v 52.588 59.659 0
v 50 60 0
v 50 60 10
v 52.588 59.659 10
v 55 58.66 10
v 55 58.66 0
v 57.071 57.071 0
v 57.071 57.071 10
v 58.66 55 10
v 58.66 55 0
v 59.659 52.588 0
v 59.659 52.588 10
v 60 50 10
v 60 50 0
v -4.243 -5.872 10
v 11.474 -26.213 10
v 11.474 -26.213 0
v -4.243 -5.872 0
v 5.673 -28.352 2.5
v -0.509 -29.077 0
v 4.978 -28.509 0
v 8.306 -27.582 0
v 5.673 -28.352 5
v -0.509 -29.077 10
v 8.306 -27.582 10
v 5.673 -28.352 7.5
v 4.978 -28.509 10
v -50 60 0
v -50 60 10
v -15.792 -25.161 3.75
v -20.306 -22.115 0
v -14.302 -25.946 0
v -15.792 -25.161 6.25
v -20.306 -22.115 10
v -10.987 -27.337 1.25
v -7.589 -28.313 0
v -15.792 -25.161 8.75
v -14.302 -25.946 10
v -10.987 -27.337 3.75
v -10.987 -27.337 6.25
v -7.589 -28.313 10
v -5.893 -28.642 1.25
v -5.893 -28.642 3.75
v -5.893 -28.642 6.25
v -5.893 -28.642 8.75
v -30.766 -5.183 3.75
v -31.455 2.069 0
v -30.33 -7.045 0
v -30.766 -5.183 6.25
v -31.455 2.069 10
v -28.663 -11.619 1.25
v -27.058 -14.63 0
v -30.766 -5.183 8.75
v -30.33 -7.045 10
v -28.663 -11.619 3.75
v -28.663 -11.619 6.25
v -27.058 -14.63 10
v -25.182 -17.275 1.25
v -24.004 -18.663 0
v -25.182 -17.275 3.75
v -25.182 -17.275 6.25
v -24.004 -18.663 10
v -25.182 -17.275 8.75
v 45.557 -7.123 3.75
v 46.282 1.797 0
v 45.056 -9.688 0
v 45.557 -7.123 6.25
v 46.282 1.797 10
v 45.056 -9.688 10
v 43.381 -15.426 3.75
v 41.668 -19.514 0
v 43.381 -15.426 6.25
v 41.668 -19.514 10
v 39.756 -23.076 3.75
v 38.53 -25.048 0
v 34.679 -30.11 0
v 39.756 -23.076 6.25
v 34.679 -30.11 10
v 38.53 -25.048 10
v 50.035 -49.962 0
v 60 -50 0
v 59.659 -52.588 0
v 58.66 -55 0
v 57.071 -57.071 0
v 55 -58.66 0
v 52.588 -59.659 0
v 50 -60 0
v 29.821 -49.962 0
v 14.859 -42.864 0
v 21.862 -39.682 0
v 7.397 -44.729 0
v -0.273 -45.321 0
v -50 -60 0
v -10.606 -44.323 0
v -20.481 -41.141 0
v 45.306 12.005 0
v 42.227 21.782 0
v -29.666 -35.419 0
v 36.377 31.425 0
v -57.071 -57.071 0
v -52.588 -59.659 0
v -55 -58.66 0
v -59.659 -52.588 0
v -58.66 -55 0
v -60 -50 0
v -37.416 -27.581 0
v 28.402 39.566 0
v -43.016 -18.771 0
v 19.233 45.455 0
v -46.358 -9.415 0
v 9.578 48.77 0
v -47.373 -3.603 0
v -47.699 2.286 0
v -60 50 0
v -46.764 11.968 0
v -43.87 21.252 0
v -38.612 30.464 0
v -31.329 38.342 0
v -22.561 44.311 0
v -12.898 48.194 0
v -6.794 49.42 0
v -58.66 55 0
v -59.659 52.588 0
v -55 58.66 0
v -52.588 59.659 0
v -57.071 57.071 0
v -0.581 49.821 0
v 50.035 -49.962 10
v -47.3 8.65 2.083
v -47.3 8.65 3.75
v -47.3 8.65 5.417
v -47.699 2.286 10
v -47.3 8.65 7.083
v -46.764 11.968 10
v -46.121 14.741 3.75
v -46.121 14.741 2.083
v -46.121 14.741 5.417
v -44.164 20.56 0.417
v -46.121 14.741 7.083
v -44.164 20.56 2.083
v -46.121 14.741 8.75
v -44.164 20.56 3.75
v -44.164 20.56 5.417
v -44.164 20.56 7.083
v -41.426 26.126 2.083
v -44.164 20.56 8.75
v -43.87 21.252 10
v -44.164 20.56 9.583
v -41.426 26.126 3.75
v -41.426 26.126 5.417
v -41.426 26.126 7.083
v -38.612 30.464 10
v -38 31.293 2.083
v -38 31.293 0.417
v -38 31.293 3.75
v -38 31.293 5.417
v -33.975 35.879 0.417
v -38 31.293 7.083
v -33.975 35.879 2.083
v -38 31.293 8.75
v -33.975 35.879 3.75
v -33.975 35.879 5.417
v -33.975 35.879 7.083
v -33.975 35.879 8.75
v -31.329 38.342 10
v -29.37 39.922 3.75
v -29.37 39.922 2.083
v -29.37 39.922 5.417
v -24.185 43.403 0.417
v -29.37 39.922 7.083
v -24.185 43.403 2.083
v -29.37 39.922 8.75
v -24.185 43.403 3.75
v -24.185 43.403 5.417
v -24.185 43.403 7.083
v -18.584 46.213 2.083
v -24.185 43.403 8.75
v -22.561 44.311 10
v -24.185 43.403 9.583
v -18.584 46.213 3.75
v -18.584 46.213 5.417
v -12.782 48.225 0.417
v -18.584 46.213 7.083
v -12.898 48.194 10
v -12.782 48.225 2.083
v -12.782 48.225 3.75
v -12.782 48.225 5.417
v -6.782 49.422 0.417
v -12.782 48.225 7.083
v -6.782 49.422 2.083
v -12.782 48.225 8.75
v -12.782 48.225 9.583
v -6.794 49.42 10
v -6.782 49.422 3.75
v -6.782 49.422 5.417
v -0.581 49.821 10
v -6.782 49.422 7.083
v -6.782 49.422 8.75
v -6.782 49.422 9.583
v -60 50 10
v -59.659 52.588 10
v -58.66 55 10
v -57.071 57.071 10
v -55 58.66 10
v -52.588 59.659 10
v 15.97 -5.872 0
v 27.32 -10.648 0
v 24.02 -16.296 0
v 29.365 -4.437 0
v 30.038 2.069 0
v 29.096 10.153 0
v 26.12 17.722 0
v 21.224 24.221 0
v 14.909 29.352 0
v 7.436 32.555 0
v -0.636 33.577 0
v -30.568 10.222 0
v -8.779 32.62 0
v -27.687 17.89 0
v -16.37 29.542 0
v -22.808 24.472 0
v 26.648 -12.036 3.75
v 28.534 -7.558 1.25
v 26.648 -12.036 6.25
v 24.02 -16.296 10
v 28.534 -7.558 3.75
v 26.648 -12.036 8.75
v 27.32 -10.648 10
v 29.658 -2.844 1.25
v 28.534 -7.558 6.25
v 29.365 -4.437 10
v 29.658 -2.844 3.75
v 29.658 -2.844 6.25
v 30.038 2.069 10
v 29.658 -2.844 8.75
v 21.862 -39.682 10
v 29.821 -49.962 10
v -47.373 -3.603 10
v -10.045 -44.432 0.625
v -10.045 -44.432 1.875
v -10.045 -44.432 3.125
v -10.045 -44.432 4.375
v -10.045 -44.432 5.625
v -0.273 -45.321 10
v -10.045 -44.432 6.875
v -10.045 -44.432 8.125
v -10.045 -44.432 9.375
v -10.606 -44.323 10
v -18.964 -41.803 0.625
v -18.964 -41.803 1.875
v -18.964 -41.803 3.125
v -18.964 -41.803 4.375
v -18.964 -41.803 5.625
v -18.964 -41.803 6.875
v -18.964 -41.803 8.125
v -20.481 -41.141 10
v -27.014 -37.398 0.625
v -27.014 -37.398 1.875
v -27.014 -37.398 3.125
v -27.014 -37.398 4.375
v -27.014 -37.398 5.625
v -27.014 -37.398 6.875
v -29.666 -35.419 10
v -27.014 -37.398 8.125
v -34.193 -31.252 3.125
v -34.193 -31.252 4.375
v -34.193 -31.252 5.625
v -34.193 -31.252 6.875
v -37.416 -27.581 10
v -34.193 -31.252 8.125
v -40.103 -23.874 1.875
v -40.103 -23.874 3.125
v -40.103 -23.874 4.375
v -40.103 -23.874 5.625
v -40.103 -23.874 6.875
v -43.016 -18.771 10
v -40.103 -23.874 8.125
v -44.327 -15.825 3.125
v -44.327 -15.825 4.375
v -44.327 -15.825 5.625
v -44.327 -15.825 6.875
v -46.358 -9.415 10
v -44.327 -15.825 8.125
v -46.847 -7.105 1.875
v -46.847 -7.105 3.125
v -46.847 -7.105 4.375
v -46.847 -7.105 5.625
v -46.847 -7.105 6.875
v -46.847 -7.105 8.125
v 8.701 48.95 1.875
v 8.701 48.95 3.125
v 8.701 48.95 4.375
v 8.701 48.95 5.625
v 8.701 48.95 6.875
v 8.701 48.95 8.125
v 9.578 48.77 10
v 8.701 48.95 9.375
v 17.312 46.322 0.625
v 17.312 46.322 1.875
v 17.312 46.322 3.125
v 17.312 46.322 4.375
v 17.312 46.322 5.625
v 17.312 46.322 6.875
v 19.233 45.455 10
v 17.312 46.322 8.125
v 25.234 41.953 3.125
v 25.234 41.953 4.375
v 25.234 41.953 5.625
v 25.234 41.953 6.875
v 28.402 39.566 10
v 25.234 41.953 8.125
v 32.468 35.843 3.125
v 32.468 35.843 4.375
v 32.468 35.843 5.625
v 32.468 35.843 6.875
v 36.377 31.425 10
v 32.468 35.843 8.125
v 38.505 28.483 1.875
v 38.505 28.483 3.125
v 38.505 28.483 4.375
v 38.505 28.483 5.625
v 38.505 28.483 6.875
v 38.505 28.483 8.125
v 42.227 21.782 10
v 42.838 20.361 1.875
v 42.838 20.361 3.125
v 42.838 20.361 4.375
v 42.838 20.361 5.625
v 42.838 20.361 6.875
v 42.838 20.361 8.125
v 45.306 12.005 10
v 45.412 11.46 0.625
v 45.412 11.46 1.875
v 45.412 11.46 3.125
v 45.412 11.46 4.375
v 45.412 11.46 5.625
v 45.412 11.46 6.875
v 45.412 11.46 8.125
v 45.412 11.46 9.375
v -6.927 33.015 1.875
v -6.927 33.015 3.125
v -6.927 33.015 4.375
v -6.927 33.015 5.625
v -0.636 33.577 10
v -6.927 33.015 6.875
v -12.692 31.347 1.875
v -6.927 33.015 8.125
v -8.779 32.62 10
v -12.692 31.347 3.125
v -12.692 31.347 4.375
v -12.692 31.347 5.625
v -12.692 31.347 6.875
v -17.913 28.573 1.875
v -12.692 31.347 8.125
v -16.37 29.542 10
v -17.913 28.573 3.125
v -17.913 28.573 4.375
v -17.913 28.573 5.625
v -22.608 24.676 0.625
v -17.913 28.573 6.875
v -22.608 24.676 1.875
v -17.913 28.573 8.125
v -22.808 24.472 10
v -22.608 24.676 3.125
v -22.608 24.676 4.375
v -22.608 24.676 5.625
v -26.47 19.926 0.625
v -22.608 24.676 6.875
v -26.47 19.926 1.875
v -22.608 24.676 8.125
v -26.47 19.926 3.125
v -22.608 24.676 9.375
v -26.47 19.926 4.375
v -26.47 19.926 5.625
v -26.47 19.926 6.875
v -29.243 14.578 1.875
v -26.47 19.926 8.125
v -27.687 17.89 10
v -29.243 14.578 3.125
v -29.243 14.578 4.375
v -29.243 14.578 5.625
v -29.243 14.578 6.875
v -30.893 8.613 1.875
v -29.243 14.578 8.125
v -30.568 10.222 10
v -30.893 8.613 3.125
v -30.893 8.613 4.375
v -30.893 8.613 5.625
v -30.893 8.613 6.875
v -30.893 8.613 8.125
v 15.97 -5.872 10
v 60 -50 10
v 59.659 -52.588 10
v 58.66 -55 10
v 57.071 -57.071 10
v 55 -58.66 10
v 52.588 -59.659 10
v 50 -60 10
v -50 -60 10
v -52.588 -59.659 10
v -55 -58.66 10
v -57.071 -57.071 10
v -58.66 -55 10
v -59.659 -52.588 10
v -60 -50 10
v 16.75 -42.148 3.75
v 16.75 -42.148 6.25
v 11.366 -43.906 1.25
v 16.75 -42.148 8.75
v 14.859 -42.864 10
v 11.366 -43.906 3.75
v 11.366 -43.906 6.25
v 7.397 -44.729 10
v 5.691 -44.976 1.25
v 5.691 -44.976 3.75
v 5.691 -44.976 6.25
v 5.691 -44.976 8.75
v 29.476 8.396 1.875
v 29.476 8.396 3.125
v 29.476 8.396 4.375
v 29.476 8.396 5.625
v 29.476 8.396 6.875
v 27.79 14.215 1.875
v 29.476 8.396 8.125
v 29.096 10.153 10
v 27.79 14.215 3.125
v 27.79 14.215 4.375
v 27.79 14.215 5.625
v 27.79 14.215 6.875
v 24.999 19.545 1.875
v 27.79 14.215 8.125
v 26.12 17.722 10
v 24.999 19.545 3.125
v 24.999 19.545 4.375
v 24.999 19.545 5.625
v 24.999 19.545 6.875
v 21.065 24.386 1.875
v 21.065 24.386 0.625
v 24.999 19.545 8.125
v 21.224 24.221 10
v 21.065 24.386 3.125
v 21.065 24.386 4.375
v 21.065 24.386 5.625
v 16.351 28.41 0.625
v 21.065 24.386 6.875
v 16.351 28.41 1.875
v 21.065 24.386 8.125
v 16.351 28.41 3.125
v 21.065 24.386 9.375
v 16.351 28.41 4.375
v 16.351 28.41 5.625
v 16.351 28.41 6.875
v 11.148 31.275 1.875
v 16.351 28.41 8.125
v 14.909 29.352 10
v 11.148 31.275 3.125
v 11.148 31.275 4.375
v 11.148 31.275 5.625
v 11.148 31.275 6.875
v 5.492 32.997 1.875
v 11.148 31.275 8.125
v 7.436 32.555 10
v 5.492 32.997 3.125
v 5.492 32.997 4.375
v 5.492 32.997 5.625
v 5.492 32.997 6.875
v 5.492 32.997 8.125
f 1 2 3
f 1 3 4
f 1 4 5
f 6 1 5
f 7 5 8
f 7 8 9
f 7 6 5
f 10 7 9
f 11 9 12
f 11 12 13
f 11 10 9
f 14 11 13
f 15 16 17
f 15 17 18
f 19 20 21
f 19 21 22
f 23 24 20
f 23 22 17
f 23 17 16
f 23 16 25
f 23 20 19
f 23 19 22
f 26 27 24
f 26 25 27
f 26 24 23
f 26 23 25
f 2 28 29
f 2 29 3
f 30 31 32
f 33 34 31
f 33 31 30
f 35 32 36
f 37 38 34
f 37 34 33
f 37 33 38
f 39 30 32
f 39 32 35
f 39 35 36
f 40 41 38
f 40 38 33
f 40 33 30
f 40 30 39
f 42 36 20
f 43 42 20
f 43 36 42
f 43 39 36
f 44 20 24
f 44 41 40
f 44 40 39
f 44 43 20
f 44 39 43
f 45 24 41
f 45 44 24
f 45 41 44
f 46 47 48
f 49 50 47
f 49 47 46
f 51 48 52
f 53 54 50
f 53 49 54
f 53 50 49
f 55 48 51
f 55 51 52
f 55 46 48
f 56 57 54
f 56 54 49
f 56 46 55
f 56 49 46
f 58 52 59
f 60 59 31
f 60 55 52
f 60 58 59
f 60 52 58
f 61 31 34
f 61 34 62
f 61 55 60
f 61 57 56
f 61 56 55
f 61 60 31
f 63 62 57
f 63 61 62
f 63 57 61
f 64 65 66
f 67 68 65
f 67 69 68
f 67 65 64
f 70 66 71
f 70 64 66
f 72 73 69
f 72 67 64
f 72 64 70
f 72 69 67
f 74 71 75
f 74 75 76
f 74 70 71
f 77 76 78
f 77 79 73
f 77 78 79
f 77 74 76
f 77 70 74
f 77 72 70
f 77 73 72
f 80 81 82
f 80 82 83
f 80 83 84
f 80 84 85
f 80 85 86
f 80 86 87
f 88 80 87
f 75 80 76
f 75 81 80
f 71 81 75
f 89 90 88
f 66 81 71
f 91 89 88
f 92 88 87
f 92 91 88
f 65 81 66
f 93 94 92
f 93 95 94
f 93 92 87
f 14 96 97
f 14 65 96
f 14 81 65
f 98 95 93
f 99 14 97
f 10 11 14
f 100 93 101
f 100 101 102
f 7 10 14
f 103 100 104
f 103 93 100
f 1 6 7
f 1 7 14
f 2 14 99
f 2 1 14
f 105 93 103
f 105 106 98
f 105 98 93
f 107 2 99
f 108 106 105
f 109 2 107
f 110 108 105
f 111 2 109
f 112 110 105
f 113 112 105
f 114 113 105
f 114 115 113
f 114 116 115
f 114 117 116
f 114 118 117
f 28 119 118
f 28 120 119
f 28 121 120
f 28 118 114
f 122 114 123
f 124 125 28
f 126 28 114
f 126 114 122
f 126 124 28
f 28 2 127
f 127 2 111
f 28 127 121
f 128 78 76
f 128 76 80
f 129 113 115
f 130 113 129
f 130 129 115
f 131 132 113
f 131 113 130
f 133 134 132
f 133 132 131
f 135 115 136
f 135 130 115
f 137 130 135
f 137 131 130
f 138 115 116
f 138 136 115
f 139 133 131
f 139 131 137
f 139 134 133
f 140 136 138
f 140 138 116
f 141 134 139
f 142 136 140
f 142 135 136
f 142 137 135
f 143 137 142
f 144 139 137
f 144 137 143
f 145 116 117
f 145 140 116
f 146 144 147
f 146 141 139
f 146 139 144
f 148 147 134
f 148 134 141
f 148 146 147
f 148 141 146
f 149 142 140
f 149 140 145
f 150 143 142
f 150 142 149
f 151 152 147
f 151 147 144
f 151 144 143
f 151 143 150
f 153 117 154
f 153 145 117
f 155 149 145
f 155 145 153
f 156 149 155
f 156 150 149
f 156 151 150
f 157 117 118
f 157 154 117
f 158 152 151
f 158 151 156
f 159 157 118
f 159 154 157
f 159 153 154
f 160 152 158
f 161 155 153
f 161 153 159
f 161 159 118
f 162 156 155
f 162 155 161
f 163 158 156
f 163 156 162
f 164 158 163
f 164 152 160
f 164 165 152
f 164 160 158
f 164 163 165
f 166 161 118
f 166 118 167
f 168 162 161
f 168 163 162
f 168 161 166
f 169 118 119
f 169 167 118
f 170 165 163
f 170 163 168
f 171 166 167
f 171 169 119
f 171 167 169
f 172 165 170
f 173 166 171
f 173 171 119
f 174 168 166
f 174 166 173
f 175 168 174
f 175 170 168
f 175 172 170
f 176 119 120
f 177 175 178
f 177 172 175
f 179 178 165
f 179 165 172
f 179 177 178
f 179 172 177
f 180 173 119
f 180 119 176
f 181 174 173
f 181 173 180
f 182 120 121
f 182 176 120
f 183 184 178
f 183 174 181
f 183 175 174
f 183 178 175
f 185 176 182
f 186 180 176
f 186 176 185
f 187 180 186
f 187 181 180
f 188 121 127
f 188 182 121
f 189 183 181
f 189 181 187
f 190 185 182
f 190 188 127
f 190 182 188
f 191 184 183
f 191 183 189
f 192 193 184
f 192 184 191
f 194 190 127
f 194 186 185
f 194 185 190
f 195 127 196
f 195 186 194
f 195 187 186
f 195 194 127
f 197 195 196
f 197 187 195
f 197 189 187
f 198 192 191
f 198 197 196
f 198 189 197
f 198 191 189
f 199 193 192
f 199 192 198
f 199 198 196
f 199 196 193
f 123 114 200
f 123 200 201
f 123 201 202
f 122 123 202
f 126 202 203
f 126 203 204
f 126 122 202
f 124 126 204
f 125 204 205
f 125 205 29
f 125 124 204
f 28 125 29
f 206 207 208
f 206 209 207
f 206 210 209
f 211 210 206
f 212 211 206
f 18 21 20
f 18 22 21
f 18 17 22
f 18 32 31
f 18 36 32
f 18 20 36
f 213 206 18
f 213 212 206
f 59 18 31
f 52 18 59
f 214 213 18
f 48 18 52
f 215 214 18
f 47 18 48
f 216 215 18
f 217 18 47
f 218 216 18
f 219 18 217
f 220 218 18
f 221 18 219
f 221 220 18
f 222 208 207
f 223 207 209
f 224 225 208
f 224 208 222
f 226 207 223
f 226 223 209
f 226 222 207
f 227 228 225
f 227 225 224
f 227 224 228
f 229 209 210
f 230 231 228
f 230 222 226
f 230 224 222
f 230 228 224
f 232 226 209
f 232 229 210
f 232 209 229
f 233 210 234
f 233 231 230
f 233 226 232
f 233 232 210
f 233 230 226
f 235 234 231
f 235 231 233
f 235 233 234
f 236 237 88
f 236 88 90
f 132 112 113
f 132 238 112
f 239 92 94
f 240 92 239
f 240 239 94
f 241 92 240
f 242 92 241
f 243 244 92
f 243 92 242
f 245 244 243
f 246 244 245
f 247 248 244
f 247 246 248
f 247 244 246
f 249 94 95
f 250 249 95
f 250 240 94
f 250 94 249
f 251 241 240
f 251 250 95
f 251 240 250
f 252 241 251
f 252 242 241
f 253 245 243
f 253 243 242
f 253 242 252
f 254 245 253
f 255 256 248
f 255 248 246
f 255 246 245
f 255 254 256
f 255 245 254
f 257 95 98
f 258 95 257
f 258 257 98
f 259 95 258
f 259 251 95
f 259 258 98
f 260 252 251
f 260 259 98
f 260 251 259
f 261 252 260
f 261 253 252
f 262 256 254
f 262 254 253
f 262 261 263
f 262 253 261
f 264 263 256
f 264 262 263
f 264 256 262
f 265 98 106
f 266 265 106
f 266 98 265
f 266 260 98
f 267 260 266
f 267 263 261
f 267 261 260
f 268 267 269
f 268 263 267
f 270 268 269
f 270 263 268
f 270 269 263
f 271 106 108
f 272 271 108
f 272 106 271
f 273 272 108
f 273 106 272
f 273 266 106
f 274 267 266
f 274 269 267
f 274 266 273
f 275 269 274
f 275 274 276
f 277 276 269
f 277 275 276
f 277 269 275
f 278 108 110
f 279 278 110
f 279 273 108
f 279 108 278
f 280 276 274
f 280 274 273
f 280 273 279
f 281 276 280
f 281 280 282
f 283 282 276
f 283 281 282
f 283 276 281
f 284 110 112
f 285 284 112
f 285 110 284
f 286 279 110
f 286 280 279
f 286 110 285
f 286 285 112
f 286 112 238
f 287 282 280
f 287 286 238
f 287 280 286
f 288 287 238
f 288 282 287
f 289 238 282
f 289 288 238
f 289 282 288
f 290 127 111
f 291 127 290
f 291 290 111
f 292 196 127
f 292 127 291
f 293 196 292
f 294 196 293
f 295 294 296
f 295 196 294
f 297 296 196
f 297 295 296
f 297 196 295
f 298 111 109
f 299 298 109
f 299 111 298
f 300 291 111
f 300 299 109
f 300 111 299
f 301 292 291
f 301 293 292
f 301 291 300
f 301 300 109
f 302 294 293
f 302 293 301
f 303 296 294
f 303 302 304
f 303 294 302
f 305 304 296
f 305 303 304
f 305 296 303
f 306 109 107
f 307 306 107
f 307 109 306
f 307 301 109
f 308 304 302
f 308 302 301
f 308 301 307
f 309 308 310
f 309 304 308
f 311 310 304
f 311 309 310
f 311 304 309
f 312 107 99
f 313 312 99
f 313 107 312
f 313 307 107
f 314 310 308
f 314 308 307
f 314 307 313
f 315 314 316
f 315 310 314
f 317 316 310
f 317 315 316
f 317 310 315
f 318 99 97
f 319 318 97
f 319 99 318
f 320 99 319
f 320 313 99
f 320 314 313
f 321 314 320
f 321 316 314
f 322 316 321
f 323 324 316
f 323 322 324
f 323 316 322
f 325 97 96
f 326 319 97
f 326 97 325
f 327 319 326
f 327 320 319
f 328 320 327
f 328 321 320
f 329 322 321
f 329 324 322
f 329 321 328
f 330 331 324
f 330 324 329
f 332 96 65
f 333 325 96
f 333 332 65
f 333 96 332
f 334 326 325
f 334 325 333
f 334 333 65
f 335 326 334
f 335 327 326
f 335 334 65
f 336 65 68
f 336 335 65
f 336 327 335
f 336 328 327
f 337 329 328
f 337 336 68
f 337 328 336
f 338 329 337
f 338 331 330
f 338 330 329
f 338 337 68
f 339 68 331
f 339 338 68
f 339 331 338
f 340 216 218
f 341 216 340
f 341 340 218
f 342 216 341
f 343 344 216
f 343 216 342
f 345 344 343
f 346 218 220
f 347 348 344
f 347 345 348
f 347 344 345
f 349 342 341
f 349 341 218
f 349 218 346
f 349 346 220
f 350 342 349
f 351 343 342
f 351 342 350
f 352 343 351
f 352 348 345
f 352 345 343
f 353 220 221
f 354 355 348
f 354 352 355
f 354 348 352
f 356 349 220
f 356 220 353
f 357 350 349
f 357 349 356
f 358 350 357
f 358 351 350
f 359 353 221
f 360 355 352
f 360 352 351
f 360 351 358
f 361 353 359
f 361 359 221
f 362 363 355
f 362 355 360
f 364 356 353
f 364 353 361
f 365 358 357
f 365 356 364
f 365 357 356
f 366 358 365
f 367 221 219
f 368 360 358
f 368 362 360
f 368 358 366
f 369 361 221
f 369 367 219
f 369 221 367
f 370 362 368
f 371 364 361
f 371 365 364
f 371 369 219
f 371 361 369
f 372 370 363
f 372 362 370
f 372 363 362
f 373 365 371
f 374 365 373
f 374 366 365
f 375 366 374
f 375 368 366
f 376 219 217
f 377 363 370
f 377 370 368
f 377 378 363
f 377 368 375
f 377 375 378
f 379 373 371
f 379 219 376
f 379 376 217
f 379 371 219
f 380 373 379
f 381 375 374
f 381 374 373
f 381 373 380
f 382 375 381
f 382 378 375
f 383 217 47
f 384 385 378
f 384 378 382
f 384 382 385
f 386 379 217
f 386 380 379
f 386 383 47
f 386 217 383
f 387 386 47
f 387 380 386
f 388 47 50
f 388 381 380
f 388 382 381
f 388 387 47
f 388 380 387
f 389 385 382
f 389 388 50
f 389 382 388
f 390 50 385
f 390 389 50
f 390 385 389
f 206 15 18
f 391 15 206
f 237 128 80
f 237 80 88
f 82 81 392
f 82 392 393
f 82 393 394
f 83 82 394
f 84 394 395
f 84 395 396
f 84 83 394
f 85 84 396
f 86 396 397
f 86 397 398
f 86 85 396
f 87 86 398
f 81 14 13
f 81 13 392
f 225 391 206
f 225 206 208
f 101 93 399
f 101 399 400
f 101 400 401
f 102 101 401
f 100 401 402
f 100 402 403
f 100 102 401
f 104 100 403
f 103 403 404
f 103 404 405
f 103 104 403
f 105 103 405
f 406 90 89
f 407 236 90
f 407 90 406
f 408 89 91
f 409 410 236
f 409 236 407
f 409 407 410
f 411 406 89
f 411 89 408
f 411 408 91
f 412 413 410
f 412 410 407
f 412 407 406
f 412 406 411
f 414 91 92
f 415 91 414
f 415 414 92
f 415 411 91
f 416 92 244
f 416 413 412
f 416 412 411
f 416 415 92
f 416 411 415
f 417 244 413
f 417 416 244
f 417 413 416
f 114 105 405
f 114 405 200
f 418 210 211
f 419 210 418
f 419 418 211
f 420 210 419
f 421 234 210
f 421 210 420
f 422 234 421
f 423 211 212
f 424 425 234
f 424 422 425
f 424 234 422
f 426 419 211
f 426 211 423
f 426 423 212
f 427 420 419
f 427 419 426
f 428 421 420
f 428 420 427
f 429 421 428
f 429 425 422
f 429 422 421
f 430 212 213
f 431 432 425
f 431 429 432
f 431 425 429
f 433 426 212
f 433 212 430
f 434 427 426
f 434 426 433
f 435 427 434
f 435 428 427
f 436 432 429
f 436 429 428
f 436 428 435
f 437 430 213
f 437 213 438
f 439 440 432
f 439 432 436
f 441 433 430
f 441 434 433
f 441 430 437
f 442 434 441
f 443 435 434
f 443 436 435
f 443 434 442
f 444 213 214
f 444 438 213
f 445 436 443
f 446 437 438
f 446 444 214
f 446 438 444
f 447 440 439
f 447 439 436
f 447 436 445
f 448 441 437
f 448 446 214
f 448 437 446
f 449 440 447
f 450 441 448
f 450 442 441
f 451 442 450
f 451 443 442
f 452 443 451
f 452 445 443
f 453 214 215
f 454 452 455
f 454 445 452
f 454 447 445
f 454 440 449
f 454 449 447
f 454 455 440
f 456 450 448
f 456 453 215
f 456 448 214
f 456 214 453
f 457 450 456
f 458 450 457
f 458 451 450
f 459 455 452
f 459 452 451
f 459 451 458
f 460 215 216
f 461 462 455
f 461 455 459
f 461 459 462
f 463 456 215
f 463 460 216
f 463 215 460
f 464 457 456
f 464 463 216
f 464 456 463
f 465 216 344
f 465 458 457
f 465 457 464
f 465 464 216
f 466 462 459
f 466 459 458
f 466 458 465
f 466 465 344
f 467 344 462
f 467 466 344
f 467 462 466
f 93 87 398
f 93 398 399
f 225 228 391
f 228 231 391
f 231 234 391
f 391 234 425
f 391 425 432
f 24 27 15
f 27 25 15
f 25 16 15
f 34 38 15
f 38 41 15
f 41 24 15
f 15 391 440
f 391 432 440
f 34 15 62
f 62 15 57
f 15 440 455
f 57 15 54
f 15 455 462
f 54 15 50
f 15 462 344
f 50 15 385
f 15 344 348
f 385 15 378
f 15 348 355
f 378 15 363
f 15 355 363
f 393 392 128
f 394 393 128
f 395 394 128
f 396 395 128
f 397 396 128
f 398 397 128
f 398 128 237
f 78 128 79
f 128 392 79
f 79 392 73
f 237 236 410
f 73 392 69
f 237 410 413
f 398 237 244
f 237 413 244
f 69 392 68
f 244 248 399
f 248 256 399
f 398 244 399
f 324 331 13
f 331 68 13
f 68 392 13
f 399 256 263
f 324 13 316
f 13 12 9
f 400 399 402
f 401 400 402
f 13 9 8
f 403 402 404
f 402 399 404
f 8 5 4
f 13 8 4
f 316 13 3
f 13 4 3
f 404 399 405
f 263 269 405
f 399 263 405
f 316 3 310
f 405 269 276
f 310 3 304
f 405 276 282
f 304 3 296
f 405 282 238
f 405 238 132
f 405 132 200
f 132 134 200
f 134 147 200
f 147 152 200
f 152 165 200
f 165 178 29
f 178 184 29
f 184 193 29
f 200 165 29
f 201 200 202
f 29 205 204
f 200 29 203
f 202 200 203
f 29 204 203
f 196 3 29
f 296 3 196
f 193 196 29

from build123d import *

# Parameters (mm, degrees)
BOSS_EXTRUDE1_DEPTH = 10
CUT_EXTRUDE30_DEPTH = 10


with BuildPart() as part:
    # Sketch1 → Boss-Extrude1 (new body)
    with BuildSketch(Plane.XY):
        with BuildLine():
            Line((-50, 60), (50, 60))
            ThreePointArc((50, 60), (57.071067812, 57.071067812), (60, 50))
            Line((60, 50), (60, -50))
            ThreePointArc((60, -50), (57.071067812, -57.071067812), (50, -60))
            Line((50, -60), (-50, -60))
            ThreePointArc((-50, -60), (-57.071067812, -57.071067812), (-60, -50))
            Line((-60, -50), (-60, 50))
            ThreePointArc((-60, 50), (-57.071067812, 57.071067812), (-50, 60))
        make_face()
    extrude(amount=BOSS_EXTRUDE1_DEPTH)

    # Sketch2 → Cut-Extrude30 (cut)
    with BuildSketch(Plane.XY.offset(10)):
        with BuildLine():
            Line((34.679487179, -30.110276442), (50.034755609, -49.961538462))
            Line((50.034755609, -49.961538462), (29.820913462, -49.961538462))
            Line((29.820913462, -49.961538462), (21.862279647, -39.682391827))
            add(Edge.make_bspline(
                [(21.862279647, -39.682391827), (21.028636889, -40.13631813), (19.365283671, -41.042029562), (16.756926427, -42.17144448), (14.100283795, -43.162249693), (11.356860263, -43.938644226), (8.552995064, -44.549760982), (5.674160188, -45.016358639), (2.722415565, -45.262385211), (0.730299256, -45.301040212), (-0.273237179, -45.320512821)],
                knots=[0, 0, 0, 0, 0.985706899, 1.966764212, 2.949968678, 3.929638882, 4.925906056, 5.930211904, 6.957336097, 8, 8, 8, 8], degree=3))
            add(Edge.make_bspline(
                [(-0.273237179, -45.320512821), (-1.943707755, -45.2830191), (-5.220125373, -45.20947989), (-10.018525485, -44.503359304), (-14.612024859, -43.437309106), (-18.983572708, -41.879755235), (-23.147896164, -39.900451393), (-27.071705006, -37.44757751), (-30.800639809, -34.589140476), (-34.243467737, -31.297087019), (-37.393601579, -27.729534621), (-40.146065424, -23.939279645), (-42.485840439, -19.985458154), (-44.393993134, -15.861867917), (-45.877775794, -11.561399926), (-46.916857054, -7.095800135), (-47.575617941, -2.458897103), (-47.657273074, 0.688675998), (-47.698717949, 2.286258013)],
                knots=[0, 0, 0, 0, 1.070144486, 2.098953612, 3.10240755, 4.088674545, 5.067611437, 6.052256776, 7.0494179, 8.074208254, 9.100739571, 10.09639475, 11.072322686, 12.041159829, 13.004031207, 13.983083054, 14.976293755, 16, 16, 16, 16], degree=3))
            add(Edge.make_bspline(
                [(-47.698717949, 2.286258013), (-47.68490183, 3.356733224), (-47.657444538, 5.484128975), (-47.327210884, 8.6368946), (-46.850752443, 11.727833839), (-46.151190307, 14.74033241), (-45.288582206, 17.696491246), (-44.191031683, 20.572805967), (-42.919073323, 23.396589439), (-41.459855526, 26.144382866), (-39.802380811, 28.775558698), (-38.041061641, 31.31102389), (-36.081873052, 33.669369844), (-33.994159324, 35.903707249), (-31.77106306, 38.012572637), (-29.377573837, 39.952497747), (-26.859174583, 41.771624572), (-24.197719737, 43.43181558), (-21.439412994, 44.93246709), (-18.609641292, 46.236635032), (-15.729942798, 47.352337727), (-12.799243113, 48.261207723), (-9.808627646, 48.942314164), (-6.784411427, 49.460902683), (-3.699171778, 49.749373328), (-1.627421569, 49.796645772), (-0.581430288, 49.820512821)],
                knots=[0, 0, 0, 0, 1.035855852, 2.058595393, 3.065553363, 4.06176554, 5.050183643, 6.044349766, 7.039272903, 8.046842428, 9.053256483, 10.04817962, 11.033146707, 12.018200652, 13.007259073, 13.996749908, 14.99846043, 16.012935138, 17.03119782, 18.036301871, 19.027088812, 20.018894167, 21.003704893, 21.994284571, 22.987348552, 24, 24, 24, 24], degree=3))
            add(Edge.make_bspline(
                [(-0.581430288, 49.820512821), (0.998184613, 49.780346116), (4.110818488, 49.701197556), (8.68948271, 49.024406152), (13.104883273, 47.946293747), (17.338813358, 46.388632552), (21.41715076, 44.424629811), (25.299249447, 41.994489959), (29.026189183, 39.148326151), (32.517455101, 35.884771616), (35.743898736, 32.343029059), (38.55659627, 28.543134016), (40.937713959, 24.557638894), (42.923461145, 20.384954757), (44.419502424, 16.000695357), (45.487496376, 11.433969418), (46.163505462, 6.681564069), (46.242105962, 3.442758404), (46.282051282, 1.79677484)],
                knots=[0, 0, 0, 0, 1.015551519, 2.00114601, 2.970254478, 3.93428303, 4.897362978, 5.876714212, 6.874912676, 7.909046156, 8.946527051, 9.952474942, 10.9443724, 11.928494229, 12.919233427, 13.917651329, 14.941735923, 16, 16, 16, 16], degree=3))
            add(Edge.make_bspline(
                [(46.282051282, 1.79677484), (46.248842407, 0.278228079), (46.183527095, -2.708454096), (45.617682253, -7.111443251), (44.72453868, -11.355335032), (43.441766637, -15.443145433), (41.816142299, -19.370418849), (39.790609499, -23.125463581), (37.454914599, -26.752859668), (35.609241868, -28.98555815), (34.679487179, -30.110276442)],
                knots=[0, 0, 0, 0, 1.049646143, 2.064447078, 3.064298101, 4.044929938, 5.022708814, 5.998521441, 6.991758374, 8, 8, 8, 8], degree=3))
        make_face()
        with BuildLine():
            add(Edge.make_bspline(
                [(24.01963141, -16.295973558), (24.503152044, -15.602754628), (25.459053382, -14.232287977), (26.668577179, -12.058541493), (27.707571786, -9.842440449), (28.566779655, -7.572356125), (29.220378102, -5.235279024), (29.684941119, -2.846466341), (29.992583116, -0.404824089), (30.023088765, 1.239887216), (30.038461538, 2.068709936)],
                knots=[0, 0, 0, 0, 1.031533623, 2.039301536, 3.033003023, 4.018477747, 4.999688364, 5.992485227, 6.988348989, 8, 8, 8, 8], degree=3))
            add(Edge.make_bspline(
                [(30.038461538, 2.068709936), (30.009850326, 3.145674355), (29.953533519, 5.265514566), (29.530549262, 8.381710893), (28.821940832, 11.368152518), (27.833892691, 14.23214909), (26.589602509, 16.981052453), (25.026511142, 19.591973208), (23.190084094, 22.078472075), (21.098048857, 24.416603027), (18.820371693, 26.55651043), (16.398006708, 28.44114004), (13.847570492, 30.031089832), (11.167571056, 31.314870476), (8.387079976, 32.348864672), (5.476258352, 33.042886895), (2.460477205, 33.49793493), (0.405269645, 33.550364386), (-0.635817308, 33.576923077)],
                knots=[0, 0, 0, 0, 1.056263418, 2.079093448, 3.078410197, 4.062632158, 5.04680056, 6.032966551, 7.041959893, 8.074807684, 9.106532056, 10.103754224, 11.080880922, 12.048629763, 13.014470275, 13.984975, 14.979267944, 16, 16, 16, 16], degree=3))
            add(Edge.make_bspline(
                [(-0.635817308, 33.576923077), (-1.706882135, 33.548900581), (-3.814966885, 33.493746315), (-6.909817152, 33.062604664), (-9.878432223, 32.386342916), (-12.705207788, 31.393419492), (-15.398702815, 30.142314304), (-17.958793751, 28.607183918), (-20.37265042, 26.779432419), (-22.646011859, 24.712596214), (-24.70007342, 22.419154278), (-26.51393123, 19.959815561), (-28.032083163, 17.340510368), (-29.303479816, 14.585091262), (-30.26057587, 11.662702458), (-30.942282438, 8.596200892), (-31.373096623, 5.380312305), (-31.4274012, 3.188044879), (-31.455128205, 2.068709936)],
                knots=[0, 0, 0, 0, 1.042613217, 2.052085894, 3.036973397, 4.002832266, 4.963730975, 5.924467509, 6.903642813, 7.907474205, 8.911719447, 9.896835452, 10.877830278, 11.85475743, 12.846581833, 13.865885605, 14.910357018, 16, 16, 16, 16], degree=3))
            add(Edge.make_bspline(
                [(-31.455128205, 2.068709936), (-31.418374502, 0.828229349), (-31.346343335, -1.602907063), (-30.839297587, -5.149286692), (-29.97239753, -8.498855058), (-28.718537237, -11.633528512), (-27.169103125, -14.597442255), (-25.217080975, -17.327470301), (-22.947238015, -19.877591592), (-21.195083665, -21.361988659), (-20.305789263, -22.115384615)],
                knots=[0, 0, 0, 0, 1.078047314, 2.112794111, 3.106520711, 4.077995885, 5.041371964, 6.006121678, 6.988020189, 8, 8, 8, 8], degree=3))
            add(Edge.make_bspline(
                [(-20.305789263, -22.115384615), (-19.578177215, -22.673089048), (-18.135261117, -23.779064006), (-15.823836417, -25.17900528), (-13.454762015, -26.395140491), (-11.005637064, -27.367427381), (-8.484922157, -28.140683352), (-5.893153297, -28.676320773), (-3.225267882, -29.017276933), (-1.422453394, -29.056863433), (-0.508914263, -29.076923077)],
                knots=[0, 0, 0, 0, 1.027457745, 2.037535419, 3.025615023, 4.011018129, 4.9886297, 5.978868484, 6.975833209, 8, 8, 8, 8], degree=3))
            add(Edge.make_bspline(
                [(-0.508914263, -29.076923077), (0.539227598, -29.043549083), (2.619596288, -28.977307848), (5.681714216, -28.4002877), (8.665210605, -27.537340864), (10.53562665, -26.655248376), (11.474358974, -26.212540064)],
                knots=[0, 0, 0, 0, 1.010952568, 2.006554787, 2.999521277, 4, 4, 4, 4], degree=3))
            Line((11.474358974, -26.212540064), (-4.243489583, -5.871794872))
            Line((-4.243489583, -5.871794872), (15.970352564, -5.871794872))
            Line((15.970352564, -5.871794872), (24.01963141, -16.295973558))
        make_face(mode=Mode.SUBTRACT)
    extrude(amount=-CUT_EXTRUDE30_DEPTH, mode=Mode.SUBTRACT)


with BuildPart() as cut_extrude30_piece_1:
    # of the separate pieces the step leaves, piece 1, a body of its own (cut_extrude30_pieces)
    add(part.part.solids().sort_by_distance((-50, 60, 0))[0])


with BuildPart() as cut_extrude30_piece_2:
    # of the separate pieces the step leaves, piece 2, a body of its own (cut_extrude30_pieces)
    add(part.part.solids().sort_by_distance((24.01963141, -16.295973558, 0))[0])


solid = Compound([cut_extrude30_piece_1.part, cut_extrude30_piece_2.part])
